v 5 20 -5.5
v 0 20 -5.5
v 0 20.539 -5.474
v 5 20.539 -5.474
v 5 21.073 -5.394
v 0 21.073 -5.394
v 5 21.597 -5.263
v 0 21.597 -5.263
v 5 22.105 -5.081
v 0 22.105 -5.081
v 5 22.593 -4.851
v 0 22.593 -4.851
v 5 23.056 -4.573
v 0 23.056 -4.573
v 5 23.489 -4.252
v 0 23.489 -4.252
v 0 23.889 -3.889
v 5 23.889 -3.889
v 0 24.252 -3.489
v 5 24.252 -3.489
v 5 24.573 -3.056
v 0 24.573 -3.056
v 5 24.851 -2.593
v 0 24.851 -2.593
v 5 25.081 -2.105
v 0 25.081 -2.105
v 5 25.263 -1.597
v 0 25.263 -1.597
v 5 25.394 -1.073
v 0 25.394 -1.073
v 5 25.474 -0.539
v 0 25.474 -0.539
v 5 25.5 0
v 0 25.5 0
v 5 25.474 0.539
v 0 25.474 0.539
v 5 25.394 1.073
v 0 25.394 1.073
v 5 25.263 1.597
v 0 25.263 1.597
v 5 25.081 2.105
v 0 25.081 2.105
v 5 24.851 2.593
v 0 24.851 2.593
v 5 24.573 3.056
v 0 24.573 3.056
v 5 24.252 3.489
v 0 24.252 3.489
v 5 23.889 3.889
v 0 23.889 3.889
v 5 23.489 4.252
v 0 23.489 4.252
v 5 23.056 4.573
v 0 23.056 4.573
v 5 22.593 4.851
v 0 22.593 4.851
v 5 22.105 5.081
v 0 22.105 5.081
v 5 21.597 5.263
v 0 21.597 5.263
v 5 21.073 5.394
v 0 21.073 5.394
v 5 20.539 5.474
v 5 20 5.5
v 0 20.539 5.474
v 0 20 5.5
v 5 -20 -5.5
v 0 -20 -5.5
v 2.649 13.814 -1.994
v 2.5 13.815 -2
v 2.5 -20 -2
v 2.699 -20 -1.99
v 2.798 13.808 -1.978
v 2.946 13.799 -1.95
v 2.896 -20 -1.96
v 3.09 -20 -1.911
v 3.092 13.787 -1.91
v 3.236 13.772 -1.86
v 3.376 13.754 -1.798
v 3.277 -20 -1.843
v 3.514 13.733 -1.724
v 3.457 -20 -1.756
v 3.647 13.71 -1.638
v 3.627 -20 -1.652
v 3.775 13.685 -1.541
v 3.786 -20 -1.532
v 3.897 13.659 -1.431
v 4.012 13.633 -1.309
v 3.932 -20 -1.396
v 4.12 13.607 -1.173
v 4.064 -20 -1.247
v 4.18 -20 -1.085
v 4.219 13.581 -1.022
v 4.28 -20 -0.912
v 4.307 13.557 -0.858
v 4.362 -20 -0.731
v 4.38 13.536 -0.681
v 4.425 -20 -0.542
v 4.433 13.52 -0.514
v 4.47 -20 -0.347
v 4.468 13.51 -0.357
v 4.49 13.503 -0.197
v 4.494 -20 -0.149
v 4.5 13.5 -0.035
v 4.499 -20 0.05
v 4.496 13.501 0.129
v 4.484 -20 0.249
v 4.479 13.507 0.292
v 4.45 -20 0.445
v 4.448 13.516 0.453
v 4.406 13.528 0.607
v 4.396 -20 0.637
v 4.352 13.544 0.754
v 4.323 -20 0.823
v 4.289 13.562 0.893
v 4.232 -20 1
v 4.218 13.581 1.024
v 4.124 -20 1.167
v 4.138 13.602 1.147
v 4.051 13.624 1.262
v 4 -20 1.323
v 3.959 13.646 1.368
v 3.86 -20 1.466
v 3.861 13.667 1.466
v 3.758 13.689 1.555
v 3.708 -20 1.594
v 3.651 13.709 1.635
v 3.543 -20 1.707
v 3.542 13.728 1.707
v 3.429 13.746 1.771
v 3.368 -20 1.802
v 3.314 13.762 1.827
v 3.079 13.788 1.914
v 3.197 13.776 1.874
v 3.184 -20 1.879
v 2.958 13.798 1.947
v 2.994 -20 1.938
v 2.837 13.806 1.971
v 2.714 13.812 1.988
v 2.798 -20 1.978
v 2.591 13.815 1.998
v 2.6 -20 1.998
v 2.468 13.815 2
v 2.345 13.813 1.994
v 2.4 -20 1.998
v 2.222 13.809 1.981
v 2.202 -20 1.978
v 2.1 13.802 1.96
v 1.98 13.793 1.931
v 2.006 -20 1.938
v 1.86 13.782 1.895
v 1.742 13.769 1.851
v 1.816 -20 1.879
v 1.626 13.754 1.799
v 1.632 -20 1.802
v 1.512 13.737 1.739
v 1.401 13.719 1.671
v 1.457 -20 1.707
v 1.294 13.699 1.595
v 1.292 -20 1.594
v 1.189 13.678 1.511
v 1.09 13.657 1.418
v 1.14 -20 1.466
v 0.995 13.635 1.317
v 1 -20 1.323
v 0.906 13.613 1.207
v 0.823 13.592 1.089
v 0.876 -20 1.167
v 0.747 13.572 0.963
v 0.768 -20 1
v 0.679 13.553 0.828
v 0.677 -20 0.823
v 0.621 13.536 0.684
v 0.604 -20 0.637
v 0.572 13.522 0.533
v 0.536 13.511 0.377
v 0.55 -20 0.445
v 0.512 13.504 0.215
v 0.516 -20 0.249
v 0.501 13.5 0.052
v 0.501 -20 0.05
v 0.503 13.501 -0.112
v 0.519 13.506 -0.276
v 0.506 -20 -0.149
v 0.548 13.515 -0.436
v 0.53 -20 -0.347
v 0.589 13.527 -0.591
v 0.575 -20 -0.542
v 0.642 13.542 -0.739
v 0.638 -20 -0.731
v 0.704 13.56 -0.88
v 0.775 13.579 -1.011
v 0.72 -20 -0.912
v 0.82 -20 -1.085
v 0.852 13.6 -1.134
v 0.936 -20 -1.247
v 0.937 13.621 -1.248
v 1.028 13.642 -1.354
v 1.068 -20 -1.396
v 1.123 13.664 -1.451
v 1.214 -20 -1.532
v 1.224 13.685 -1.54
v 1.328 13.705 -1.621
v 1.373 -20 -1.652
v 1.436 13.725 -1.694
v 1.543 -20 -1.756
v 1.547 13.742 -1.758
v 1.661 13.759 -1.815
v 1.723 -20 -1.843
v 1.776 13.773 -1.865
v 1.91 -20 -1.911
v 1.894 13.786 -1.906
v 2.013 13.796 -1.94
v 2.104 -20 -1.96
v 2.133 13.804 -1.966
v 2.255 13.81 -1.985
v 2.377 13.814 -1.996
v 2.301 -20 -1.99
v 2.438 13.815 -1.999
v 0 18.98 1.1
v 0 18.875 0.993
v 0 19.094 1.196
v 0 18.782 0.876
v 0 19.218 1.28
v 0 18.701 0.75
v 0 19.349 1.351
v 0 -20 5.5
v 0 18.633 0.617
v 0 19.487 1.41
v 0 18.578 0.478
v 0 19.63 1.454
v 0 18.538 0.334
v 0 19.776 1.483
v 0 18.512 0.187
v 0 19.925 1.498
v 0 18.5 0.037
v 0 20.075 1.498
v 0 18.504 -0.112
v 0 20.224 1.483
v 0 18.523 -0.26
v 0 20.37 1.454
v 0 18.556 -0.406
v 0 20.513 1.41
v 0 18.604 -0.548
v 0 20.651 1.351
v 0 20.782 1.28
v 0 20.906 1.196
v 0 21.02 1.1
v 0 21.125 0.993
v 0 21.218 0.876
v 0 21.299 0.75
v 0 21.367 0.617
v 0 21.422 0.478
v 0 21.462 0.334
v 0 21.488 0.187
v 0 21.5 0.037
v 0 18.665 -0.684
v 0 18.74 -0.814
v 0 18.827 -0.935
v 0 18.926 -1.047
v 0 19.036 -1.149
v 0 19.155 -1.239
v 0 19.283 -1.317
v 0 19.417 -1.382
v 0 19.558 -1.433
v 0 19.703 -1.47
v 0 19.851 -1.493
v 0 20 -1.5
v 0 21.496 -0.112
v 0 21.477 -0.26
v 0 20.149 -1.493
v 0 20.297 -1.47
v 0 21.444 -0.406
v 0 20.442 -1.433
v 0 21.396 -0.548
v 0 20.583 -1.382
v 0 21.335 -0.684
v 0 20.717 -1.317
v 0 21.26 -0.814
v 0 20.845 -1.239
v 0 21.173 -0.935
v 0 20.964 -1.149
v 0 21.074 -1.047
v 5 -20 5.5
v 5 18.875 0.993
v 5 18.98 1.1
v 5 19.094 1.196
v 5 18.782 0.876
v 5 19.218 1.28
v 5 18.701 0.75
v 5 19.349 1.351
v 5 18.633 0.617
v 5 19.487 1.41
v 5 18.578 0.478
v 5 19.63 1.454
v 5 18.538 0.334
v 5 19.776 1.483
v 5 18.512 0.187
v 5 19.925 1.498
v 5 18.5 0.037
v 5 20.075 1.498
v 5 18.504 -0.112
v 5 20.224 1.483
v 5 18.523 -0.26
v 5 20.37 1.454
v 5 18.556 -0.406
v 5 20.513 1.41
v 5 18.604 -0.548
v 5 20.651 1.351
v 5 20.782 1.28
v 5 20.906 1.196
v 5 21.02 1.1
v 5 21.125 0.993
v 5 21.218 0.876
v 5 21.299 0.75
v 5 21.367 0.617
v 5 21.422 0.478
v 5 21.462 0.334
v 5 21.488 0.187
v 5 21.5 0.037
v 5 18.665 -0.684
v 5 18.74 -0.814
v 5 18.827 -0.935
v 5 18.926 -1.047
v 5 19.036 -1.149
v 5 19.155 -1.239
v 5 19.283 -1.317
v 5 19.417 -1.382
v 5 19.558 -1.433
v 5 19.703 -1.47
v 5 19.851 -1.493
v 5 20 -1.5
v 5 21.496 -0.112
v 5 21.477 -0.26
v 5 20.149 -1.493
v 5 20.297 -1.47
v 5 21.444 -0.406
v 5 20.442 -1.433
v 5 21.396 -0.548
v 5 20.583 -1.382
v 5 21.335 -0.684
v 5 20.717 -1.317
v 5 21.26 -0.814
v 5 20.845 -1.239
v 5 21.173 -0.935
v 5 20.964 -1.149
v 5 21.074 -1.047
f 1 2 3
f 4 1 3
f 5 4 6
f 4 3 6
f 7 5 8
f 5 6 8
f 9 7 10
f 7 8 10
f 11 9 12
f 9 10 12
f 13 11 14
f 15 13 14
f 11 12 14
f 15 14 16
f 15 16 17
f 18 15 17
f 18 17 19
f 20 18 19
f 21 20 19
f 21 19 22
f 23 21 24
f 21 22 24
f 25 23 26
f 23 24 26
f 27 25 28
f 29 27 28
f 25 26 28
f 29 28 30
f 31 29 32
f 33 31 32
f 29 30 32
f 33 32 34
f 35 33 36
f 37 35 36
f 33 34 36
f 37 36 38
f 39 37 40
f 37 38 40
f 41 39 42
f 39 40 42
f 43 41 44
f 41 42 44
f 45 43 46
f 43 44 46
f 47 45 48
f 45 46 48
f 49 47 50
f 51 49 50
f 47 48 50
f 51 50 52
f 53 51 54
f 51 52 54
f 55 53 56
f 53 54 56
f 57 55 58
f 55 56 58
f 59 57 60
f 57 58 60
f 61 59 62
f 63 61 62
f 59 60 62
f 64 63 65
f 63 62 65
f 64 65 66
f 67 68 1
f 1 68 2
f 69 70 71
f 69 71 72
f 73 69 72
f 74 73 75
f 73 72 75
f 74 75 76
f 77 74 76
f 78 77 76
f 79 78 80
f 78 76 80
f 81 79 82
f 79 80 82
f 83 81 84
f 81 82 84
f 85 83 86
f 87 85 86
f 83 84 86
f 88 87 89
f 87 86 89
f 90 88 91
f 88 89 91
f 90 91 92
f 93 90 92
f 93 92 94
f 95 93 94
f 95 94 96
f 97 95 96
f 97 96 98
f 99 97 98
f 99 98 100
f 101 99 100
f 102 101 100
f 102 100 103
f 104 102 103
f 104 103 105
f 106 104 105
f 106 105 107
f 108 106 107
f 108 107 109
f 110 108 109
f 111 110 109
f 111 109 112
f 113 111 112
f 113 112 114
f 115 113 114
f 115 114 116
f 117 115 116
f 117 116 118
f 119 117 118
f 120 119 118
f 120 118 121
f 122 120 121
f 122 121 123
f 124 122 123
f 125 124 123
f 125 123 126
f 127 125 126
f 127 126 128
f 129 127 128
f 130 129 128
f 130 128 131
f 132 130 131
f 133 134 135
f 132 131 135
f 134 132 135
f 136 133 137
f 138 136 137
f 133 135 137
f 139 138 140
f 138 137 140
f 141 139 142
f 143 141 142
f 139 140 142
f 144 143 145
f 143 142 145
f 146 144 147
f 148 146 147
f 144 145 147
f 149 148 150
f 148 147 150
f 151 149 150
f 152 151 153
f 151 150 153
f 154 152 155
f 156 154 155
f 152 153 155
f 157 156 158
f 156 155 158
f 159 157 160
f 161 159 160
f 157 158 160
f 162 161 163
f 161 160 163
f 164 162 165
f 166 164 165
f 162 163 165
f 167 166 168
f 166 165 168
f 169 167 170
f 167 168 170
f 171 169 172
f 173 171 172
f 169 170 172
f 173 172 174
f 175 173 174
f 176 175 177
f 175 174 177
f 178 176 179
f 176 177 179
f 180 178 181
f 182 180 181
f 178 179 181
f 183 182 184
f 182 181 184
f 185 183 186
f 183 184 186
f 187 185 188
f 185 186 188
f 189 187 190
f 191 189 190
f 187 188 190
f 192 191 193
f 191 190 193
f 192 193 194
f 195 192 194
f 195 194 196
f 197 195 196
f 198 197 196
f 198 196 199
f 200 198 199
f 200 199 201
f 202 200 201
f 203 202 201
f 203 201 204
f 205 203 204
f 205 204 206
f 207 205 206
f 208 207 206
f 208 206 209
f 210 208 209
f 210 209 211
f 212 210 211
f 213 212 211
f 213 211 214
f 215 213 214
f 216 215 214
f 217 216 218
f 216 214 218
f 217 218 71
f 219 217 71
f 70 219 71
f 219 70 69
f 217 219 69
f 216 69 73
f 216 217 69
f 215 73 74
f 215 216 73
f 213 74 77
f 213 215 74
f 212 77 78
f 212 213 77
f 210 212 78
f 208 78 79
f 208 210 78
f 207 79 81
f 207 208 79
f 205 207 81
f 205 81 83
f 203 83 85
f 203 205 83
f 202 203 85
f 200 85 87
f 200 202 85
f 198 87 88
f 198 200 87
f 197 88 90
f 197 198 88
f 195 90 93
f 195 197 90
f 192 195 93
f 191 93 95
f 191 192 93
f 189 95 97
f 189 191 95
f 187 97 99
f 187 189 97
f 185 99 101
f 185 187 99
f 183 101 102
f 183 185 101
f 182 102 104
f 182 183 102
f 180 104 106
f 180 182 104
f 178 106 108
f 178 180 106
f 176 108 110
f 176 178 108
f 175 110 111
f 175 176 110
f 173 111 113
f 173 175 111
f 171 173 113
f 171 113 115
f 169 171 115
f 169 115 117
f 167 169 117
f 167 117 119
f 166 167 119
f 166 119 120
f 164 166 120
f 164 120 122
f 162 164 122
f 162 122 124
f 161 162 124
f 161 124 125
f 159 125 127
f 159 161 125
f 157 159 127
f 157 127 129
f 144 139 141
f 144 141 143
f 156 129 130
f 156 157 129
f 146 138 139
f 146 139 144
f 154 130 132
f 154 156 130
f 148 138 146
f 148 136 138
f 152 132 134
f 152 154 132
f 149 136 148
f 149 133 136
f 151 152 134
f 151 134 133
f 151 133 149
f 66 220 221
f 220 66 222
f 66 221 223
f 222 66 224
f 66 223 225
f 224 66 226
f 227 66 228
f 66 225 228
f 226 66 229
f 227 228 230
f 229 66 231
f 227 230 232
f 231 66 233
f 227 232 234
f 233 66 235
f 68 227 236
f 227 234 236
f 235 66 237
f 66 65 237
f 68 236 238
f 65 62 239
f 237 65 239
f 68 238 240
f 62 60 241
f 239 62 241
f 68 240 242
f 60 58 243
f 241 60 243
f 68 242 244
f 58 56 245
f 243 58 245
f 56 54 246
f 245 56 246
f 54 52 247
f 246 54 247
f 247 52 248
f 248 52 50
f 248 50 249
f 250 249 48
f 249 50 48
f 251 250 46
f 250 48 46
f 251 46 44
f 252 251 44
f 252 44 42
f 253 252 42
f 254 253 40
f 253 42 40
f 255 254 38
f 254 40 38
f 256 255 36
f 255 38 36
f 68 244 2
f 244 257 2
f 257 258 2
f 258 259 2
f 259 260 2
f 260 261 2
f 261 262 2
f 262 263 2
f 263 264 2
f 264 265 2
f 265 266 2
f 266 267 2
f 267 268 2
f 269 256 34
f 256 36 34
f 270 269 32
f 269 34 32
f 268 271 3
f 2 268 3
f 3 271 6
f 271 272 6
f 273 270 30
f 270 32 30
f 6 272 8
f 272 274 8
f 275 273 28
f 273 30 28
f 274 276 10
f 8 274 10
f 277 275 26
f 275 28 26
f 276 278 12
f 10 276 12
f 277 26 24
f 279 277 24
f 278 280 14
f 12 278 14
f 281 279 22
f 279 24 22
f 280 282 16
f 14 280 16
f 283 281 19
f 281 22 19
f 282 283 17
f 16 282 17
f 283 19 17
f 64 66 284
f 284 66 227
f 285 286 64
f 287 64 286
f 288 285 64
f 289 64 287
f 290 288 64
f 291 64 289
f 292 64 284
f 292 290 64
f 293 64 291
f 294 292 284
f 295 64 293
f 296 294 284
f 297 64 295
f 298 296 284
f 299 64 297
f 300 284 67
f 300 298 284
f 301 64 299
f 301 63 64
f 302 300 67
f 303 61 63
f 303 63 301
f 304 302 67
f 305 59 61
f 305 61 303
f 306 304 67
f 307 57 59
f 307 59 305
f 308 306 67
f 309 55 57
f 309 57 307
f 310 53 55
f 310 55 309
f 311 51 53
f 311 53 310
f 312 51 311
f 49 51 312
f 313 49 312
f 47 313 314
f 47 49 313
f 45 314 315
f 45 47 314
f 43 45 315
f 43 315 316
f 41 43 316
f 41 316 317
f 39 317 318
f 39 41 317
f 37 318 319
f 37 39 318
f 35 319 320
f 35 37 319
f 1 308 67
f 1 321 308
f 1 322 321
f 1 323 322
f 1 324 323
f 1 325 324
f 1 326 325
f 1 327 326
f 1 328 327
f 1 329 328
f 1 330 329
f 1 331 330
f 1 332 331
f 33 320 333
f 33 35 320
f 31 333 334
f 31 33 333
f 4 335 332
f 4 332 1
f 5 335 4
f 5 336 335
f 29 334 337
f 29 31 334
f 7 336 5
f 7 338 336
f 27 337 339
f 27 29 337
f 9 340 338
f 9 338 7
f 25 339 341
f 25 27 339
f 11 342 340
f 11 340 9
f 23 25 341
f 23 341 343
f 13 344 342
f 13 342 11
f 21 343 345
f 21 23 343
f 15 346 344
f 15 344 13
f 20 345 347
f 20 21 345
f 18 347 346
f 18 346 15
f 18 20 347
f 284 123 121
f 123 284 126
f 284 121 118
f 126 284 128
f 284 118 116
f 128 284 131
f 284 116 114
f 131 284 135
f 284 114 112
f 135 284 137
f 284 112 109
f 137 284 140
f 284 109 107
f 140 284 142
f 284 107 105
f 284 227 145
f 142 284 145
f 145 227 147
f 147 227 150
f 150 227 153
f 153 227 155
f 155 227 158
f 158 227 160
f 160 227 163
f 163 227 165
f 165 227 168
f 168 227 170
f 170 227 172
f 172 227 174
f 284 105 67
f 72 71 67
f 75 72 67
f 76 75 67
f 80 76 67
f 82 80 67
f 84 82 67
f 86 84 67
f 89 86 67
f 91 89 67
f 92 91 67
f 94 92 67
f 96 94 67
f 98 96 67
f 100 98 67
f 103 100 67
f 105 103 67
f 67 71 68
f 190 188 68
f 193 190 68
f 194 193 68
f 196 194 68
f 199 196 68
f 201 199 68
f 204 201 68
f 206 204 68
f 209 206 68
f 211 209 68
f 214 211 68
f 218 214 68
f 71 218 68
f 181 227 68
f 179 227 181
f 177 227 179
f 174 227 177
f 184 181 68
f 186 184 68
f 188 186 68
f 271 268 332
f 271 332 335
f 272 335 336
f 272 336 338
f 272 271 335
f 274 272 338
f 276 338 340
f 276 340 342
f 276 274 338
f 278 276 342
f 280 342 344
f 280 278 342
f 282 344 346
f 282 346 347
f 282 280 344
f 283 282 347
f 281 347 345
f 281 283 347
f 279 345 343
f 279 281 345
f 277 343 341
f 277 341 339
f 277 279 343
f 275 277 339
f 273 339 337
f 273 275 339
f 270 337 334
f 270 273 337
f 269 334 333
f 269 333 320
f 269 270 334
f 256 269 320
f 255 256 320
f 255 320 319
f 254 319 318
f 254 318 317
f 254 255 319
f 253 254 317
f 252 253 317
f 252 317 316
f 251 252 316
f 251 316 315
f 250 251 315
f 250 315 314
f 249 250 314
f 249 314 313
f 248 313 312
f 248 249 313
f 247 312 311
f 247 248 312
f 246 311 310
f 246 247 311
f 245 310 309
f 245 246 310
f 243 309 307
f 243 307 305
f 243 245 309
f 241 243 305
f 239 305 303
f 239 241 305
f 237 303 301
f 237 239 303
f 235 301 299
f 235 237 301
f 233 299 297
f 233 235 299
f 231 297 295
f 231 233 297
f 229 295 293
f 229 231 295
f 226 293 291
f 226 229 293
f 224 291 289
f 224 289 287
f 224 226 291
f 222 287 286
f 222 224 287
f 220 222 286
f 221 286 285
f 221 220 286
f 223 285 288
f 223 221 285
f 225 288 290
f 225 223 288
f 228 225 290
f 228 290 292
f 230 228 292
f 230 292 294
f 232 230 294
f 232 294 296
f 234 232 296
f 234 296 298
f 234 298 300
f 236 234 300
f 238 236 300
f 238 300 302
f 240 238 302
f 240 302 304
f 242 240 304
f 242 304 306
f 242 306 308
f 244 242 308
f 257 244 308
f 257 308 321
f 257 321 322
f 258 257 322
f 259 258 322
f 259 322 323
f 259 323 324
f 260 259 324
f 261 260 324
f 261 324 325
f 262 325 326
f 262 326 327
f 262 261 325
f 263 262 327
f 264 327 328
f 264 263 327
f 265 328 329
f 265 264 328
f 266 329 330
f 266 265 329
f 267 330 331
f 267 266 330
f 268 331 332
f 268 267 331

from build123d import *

# Parameters (mm, degrees)
SKETCH1_R               = 1.5
BOSS_EXTRUDE1_DEPTH     = 5
CUT_EXTRUDE1_REACH      = 48.103
CUT_EXTRUDE1_END_RADIUS = 6.5
SKETCH2_R               = 2


with BuildPart() as part:
    # Sketch1 → Boss-Extrude1 (new body)
    with BuildSketch(Plane(origin=(0, 0, 0), x_dir=(0, 0, -1), z_dir=(1, 0, 0))):
        with BuildLine():
            Line((-5.5, 20), (-5.5, -20))
            Line((-5.5, -20), (5.5, -20))
            Line((5.5, -20), (5.5, 20))
            ThreePointArc((5.5, 20), (0, 25.5), (-5.5, 20))
        make_face()
        with Locations((0, 20)):
            Circle(SKETCH1_R, mode=Mode.SUBTRACT)
    extrude(amount=BOSS_EXTRUDE1_DEPTH)

    # Cut-Extrude1: up to this cylinder (the profile starts outside it)
    cut_extrude1_end = Plane(origin=(2.5, 20, 0), z_dir=(-1, 0, 0)) * Cylinder(CUT_EXTRUDE1_END_RADIUS, 110.206, mode=Mode.PRIVATE)
    # Sketch2 → Cut-Extrude1 (cut, up to the surface)
    with BuildSketch(Plane.XZ.offset(20), mode=Mode.PRIVATE) as cut_extrude1_sk1:
        with Locations(Location((2.5, 0, 0), (0, 0, 270))):
            Circle(SKETCH2_R)
    cut_extrude1_tool1 = extrude(cut_extrude1_sk1.sketch, amount=-CUT_EXTRUDE1_REACH, mode=Mode.PRIVATE) - cut_extrude1_end
    add(cut_extrude1_tool1.solids().sort_by_distance((2.5, -20, 0))[0], mode=Mode.SUBTRACT)


solid = part.part
